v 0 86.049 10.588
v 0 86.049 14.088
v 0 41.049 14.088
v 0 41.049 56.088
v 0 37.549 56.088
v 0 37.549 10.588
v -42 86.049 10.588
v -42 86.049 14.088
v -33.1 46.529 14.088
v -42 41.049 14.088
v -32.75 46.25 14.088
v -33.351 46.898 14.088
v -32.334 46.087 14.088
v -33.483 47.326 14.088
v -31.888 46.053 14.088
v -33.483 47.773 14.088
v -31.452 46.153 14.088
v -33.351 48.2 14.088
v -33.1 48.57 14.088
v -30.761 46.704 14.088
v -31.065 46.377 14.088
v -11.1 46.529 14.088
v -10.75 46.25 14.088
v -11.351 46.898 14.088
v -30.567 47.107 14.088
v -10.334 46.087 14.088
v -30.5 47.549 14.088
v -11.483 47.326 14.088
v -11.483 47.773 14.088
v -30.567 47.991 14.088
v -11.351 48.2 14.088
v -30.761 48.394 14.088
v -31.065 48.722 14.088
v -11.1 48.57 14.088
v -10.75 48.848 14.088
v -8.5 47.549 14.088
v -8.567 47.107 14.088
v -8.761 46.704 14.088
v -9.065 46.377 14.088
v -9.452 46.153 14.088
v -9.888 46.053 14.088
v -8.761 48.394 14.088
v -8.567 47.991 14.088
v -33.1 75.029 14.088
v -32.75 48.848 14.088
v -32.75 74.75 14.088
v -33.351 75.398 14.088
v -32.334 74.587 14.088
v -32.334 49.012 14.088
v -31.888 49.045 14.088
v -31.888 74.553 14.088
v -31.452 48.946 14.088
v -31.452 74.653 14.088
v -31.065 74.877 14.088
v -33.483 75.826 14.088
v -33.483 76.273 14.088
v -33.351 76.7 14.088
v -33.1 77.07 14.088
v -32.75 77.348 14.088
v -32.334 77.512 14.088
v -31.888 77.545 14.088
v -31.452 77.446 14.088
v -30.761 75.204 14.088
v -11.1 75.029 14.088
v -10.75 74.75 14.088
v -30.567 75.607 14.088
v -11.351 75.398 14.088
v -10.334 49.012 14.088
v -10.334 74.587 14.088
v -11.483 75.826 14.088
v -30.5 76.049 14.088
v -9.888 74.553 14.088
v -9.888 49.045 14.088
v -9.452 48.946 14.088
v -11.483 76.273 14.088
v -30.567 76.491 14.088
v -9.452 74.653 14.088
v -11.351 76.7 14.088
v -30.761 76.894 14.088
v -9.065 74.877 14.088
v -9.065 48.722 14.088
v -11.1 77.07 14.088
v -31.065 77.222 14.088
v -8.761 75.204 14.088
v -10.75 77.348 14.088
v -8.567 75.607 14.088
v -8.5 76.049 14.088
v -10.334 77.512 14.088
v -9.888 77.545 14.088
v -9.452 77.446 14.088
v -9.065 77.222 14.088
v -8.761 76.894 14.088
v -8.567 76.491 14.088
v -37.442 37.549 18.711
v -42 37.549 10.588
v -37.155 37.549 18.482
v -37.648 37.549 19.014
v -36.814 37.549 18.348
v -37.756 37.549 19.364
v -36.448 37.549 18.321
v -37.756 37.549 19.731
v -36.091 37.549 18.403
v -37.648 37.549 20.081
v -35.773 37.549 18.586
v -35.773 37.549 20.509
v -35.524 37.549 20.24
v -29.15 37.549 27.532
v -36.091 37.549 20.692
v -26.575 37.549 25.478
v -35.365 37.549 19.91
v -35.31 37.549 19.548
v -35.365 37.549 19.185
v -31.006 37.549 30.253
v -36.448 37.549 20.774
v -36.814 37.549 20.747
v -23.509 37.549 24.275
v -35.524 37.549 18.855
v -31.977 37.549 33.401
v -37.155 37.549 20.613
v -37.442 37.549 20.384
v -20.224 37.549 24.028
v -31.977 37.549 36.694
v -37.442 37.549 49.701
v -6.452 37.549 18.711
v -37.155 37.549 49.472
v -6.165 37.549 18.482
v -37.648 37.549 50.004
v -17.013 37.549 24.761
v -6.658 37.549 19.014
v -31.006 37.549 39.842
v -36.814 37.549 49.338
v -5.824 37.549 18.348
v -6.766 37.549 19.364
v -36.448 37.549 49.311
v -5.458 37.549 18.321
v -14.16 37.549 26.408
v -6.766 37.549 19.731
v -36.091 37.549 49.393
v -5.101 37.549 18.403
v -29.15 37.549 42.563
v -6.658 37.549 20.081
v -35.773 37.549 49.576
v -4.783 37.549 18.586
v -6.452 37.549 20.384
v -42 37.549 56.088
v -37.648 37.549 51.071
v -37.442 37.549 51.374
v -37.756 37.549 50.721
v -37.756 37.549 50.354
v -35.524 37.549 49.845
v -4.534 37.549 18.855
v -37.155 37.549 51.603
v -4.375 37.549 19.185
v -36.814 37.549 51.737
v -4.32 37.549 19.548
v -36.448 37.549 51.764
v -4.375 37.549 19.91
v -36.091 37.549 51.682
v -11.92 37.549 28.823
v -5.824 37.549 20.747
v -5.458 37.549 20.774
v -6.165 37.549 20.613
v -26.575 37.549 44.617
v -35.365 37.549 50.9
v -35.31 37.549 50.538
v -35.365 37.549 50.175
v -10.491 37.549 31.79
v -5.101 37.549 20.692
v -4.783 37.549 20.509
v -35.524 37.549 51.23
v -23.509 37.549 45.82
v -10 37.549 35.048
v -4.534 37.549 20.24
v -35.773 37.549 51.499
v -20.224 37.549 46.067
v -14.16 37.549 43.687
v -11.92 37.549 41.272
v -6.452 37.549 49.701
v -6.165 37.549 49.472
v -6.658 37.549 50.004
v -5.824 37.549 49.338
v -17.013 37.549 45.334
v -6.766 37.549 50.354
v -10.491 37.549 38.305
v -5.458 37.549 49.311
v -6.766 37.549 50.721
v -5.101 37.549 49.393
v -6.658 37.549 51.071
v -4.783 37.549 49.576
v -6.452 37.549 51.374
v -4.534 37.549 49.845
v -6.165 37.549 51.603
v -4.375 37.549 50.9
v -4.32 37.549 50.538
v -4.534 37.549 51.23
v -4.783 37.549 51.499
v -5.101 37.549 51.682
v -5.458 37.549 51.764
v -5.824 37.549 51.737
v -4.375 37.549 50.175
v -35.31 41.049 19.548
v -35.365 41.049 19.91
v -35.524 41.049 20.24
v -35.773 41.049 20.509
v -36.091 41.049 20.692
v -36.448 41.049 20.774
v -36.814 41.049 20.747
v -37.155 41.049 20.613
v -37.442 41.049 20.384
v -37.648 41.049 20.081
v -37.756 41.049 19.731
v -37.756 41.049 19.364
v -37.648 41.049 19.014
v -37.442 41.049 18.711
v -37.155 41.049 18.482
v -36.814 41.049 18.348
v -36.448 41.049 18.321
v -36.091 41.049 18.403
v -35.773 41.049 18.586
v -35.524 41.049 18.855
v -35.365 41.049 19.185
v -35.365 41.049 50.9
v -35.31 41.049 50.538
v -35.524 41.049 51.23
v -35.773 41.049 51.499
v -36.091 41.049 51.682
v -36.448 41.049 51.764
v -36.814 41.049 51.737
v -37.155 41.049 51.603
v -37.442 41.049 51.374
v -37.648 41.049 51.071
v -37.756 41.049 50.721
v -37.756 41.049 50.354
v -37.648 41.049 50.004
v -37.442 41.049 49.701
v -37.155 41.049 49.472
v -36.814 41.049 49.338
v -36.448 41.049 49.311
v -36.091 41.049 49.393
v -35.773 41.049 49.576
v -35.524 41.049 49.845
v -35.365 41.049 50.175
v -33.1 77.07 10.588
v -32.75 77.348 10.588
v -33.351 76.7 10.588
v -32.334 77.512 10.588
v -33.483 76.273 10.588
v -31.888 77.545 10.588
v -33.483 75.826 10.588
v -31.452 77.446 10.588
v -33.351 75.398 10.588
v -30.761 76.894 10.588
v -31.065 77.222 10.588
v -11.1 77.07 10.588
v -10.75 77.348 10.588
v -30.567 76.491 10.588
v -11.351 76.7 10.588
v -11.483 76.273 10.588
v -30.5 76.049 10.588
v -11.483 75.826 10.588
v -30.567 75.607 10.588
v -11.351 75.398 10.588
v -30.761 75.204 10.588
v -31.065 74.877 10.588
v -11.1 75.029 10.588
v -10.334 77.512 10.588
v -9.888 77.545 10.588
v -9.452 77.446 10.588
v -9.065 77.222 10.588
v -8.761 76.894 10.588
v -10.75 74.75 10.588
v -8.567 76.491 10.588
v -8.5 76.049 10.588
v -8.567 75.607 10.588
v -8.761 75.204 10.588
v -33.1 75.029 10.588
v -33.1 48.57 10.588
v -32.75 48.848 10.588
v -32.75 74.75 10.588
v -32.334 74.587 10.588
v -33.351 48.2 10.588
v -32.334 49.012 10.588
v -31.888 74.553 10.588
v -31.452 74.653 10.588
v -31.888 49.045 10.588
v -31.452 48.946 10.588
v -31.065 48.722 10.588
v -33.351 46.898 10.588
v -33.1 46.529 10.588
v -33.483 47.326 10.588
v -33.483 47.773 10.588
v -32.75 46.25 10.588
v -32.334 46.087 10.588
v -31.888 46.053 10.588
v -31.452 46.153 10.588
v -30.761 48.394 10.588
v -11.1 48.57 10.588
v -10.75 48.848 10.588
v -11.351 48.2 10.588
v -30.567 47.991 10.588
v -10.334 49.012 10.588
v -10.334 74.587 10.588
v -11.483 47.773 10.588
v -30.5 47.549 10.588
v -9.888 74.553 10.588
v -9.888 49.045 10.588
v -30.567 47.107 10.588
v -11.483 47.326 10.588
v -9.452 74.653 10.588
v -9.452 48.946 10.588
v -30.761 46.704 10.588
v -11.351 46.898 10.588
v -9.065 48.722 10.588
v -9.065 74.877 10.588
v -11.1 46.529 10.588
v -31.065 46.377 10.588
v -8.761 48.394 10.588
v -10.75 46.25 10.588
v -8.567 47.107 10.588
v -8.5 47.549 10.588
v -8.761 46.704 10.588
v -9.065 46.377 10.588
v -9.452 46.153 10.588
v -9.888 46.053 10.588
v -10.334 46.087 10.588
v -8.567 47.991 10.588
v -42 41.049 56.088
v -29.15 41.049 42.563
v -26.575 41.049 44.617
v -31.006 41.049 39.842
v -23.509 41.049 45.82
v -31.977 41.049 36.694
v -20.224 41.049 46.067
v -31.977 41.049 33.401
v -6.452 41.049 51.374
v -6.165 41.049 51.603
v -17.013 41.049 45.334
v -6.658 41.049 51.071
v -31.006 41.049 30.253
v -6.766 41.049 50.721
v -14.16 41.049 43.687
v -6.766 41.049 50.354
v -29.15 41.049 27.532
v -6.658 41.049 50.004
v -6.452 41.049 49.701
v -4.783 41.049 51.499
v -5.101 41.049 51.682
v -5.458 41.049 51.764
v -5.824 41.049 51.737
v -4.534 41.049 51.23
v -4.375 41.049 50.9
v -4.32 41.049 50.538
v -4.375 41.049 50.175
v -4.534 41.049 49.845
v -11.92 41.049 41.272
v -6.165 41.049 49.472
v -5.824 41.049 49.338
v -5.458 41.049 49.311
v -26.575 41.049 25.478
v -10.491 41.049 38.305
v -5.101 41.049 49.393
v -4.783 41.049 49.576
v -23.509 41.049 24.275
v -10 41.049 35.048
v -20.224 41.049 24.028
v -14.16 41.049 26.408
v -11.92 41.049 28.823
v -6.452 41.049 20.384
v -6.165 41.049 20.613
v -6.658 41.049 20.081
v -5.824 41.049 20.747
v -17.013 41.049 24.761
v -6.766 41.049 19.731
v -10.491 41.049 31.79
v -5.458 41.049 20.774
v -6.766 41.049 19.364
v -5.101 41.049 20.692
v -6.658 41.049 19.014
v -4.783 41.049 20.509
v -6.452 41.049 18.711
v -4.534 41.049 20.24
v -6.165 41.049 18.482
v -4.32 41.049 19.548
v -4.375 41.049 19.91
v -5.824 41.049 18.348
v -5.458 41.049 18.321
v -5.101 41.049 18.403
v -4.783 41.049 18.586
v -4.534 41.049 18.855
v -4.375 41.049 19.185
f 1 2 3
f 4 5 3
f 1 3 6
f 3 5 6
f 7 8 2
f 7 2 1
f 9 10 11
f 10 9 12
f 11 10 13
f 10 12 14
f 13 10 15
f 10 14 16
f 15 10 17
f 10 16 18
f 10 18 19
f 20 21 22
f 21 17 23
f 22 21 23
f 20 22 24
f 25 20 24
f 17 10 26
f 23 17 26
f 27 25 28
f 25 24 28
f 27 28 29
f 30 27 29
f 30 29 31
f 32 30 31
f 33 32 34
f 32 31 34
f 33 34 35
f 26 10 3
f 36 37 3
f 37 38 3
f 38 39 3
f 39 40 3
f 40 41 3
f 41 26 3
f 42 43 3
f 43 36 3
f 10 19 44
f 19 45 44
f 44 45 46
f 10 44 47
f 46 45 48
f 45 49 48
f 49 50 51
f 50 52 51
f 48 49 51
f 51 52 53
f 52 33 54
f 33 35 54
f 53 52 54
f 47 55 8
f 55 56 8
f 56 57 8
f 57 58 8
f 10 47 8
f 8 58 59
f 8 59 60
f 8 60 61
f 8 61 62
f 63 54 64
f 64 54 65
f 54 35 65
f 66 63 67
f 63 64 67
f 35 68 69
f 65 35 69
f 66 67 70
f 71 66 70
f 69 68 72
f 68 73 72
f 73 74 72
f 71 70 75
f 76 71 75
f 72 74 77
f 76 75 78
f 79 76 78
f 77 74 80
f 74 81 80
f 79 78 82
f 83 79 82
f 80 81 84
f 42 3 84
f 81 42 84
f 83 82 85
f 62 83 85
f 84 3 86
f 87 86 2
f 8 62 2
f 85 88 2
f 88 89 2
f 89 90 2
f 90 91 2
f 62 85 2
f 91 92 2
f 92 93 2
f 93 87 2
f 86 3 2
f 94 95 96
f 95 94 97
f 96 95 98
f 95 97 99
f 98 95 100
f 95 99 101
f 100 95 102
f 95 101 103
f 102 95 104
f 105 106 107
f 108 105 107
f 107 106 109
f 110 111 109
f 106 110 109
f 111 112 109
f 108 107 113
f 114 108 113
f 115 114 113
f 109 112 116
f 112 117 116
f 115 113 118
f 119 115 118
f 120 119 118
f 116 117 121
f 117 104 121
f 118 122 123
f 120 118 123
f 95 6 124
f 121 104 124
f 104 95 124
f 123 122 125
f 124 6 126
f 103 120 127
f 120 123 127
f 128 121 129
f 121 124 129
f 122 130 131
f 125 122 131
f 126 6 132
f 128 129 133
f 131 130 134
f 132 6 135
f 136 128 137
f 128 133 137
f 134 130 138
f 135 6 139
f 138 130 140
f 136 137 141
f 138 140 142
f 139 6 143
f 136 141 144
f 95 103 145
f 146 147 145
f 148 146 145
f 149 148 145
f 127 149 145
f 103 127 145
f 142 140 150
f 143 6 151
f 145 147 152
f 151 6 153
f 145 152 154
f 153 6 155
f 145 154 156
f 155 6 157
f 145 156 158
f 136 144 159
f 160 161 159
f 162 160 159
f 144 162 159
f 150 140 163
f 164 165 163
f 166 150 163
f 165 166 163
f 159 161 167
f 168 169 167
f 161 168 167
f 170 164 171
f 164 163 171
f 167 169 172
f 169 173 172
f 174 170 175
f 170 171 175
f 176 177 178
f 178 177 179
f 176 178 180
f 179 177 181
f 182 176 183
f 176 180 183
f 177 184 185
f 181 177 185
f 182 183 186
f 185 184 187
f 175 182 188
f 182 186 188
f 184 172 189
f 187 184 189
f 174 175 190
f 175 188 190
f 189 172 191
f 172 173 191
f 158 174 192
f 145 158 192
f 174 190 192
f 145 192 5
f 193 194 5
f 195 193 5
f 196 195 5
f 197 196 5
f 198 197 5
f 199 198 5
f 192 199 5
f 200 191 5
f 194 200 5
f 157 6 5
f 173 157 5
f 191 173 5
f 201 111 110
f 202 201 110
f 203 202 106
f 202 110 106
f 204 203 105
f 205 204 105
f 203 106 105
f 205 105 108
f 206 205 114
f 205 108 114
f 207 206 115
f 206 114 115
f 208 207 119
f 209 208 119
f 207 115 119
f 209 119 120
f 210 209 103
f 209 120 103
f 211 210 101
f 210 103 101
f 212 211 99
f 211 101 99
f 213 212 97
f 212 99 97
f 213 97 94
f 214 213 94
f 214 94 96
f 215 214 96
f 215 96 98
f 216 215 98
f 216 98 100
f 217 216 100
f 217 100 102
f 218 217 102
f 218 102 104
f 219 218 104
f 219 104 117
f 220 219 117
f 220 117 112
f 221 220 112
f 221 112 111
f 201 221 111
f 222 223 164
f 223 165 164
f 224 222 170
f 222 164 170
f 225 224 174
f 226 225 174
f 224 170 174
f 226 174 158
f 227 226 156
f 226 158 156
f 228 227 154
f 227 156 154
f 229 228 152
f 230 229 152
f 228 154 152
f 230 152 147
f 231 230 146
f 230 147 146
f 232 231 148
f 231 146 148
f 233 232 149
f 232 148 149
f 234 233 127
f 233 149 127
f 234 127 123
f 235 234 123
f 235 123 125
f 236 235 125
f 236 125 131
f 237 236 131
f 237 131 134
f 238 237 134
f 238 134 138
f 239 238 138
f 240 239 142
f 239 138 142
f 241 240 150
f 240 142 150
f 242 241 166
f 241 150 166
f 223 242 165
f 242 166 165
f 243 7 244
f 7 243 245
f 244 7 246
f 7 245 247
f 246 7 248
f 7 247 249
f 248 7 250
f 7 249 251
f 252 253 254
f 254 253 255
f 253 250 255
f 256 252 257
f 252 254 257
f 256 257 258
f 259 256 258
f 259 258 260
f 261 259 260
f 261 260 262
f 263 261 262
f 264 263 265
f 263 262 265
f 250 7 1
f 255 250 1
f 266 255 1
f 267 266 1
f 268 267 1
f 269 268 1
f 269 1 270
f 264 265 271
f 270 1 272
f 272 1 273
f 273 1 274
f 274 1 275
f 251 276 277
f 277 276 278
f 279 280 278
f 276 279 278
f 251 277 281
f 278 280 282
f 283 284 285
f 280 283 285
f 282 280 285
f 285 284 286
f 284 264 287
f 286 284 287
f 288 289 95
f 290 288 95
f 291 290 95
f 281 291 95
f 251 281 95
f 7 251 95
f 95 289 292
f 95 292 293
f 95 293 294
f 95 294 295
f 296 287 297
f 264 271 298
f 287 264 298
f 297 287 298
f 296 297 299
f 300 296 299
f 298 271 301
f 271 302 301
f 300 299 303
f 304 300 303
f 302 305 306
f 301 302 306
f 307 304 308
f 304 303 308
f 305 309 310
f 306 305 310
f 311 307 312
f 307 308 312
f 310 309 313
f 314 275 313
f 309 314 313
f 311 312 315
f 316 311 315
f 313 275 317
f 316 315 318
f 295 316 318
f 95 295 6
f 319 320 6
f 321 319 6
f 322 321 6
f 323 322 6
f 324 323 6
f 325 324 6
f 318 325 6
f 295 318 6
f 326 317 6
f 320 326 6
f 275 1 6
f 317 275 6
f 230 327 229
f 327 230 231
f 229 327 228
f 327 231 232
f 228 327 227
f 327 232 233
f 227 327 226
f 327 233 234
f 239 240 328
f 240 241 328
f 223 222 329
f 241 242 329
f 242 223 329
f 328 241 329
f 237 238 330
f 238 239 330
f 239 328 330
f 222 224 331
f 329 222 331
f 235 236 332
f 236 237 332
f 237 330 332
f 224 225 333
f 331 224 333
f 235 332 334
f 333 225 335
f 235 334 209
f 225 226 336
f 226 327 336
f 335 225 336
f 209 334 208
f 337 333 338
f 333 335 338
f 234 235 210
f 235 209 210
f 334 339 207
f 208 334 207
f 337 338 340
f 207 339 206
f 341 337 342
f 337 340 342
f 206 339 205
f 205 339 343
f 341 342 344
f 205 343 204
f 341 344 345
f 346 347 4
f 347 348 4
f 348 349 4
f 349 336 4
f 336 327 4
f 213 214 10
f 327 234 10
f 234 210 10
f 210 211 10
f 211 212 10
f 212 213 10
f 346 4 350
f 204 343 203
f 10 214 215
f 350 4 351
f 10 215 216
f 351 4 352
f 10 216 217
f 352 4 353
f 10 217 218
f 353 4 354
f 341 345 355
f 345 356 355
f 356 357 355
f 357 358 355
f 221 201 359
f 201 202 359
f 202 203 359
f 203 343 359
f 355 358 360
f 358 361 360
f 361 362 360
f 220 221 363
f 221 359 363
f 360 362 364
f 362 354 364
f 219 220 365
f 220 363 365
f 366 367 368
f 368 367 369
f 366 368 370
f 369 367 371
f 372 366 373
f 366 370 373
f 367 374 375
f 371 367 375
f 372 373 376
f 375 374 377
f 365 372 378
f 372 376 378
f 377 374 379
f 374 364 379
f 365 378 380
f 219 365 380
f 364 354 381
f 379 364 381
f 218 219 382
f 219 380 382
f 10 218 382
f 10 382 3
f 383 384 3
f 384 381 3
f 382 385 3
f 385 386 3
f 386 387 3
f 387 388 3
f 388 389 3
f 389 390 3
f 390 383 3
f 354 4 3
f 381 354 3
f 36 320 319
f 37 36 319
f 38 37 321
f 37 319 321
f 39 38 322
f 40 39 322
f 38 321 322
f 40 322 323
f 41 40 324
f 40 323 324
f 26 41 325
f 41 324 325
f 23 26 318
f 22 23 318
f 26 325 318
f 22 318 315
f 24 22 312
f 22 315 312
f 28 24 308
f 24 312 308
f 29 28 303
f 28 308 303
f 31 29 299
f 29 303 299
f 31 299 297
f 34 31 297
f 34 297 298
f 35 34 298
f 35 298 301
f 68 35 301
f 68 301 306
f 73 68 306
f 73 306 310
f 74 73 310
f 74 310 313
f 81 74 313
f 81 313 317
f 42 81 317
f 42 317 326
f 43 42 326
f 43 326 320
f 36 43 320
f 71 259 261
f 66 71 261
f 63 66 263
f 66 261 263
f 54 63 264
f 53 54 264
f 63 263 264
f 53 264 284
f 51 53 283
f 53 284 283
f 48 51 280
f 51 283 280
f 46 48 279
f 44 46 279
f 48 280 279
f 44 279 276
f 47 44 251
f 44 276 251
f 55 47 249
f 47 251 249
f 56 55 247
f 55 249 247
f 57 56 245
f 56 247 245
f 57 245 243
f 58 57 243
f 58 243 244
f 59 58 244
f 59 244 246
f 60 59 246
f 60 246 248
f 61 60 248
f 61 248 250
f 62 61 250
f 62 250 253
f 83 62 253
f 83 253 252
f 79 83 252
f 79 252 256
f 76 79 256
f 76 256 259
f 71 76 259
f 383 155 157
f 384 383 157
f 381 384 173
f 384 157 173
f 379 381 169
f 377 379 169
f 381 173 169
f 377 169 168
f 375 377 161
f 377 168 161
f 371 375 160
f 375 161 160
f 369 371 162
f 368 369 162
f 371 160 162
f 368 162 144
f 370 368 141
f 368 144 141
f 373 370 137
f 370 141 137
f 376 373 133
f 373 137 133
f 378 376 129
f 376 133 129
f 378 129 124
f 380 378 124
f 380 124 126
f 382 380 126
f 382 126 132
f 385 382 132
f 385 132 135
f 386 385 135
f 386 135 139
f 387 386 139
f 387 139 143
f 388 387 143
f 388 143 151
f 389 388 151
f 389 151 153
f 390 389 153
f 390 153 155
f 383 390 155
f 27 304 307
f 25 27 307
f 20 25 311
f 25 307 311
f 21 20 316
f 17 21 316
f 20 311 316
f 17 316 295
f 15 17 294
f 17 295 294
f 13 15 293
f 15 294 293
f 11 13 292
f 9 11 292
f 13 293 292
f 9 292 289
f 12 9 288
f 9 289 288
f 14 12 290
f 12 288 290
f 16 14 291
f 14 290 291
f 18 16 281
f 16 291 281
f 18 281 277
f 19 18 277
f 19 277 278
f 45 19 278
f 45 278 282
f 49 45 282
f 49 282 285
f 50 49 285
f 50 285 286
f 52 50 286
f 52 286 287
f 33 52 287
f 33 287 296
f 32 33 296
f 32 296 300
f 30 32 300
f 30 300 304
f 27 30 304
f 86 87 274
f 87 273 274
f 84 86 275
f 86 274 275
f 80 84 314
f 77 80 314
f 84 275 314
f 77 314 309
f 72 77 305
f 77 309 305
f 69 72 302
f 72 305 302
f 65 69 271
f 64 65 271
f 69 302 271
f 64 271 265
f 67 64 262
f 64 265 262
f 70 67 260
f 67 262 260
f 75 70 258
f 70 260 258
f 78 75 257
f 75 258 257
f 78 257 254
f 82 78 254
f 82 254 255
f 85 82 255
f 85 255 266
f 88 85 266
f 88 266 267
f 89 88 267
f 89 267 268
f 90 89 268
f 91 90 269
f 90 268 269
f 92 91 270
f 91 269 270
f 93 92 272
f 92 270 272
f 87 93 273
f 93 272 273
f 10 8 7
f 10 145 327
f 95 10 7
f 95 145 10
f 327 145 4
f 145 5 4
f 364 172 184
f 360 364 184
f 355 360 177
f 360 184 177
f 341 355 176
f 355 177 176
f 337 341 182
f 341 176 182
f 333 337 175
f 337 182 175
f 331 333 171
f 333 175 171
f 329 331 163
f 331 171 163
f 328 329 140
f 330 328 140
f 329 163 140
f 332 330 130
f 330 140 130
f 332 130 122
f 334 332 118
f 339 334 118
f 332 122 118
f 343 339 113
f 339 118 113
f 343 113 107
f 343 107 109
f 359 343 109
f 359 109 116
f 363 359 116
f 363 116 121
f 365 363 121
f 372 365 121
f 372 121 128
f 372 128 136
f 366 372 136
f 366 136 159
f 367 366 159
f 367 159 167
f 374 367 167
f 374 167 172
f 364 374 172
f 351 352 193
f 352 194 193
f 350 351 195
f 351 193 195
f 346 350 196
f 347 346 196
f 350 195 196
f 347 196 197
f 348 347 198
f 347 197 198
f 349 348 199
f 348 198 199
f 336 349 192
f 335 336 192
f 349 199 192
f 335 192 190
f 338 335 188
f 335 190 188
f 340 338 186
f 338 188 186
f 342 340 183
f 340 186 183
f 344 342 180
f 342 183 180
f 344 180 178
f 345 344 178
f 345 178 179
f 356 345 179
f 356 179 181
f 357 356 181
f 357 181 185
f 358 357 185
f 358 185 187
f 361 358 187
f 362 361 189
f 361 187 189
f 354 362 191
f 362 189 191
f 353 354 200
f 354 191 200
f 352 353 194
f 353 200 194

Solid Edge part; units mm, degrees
sketch "Sketch1" plane through (0, 0, 0) normal (1, 0, 0) x (0, 1, 0)
  line L0 (37.5493, 56.0875) -> (41.0493, 56.0875)
  line L1 (41.0493, 56.0875) -> (41.0493, 14.0875)
  line L2 (41.0493, 14.0875) -> (86.0493, 14.0875)
  line L3 (86.0493, 14.0875) -> (86.0493, 10.5875)
  line L4 (86.0493, 10.5875) -> (37.5493, 10.5875)
  line L5 (37.5493, 10.5875) -> (37.5493, 56.0875)
  dimension "D1" = 3.5
  dimension "D2" = 42
  dimension "D3" = 45.5
  dimension "D4" = 3.5
  dimension "D5" = 45
extrude "Protrusion1" add sketch "Sketch1" against normal blind 42
sketch "Sketch2" plane through (-21, 37.5493, 33.3375) normal (0, -1, 0) x (1, 0, 0)
  circle A0 centre (-15.54, -13.79) radius 1.23
  circle A1 centre (15.45, -13.79) radius 1.23
  circle A2 centre (-15.54, 17.2) radius 1.23
  circle A3 centre (15.45, 17.2) radius 1.23
  dimension "D1" = 2.46
  dimension "D2" = 5.46
  dimension "D3" = 5.46
  dimension "D4" = 5.46
  dimension "D5" = 30.99
  dimension "D6" = 5.46
  dimension "D7" = 30.99
  dimension "D8" = 2.46
  dimension "D9" = 30.99
  dimension "D10" = 30.99
extrude "Cutout1" cut sketch "Sketch2" against normal through all
sketch "Sketch3" plane through (-21, 37.5493, 33.3375) normal (0, -1, 0) x (1, 0, 0)
  circle A0 centre (-0.05, 1.71) radius 11.05
  dimension "D1" = 15.49
  dimension "D2" = 15.49
  dimension "D3" = 15.5
  dimension "D4" = 15.49
  dimension "D5" = 15.5
extrude "Cutout2" cut sketch "Sketch3" against normal through all
sketch "Sketch4" plane through (-21, 61.7993, 10.5875) normal (0, 0, -1) x (1, 0, 0)
  circle A0 centre (-11, -14.25) radius 1.5
  circle A1 centre (11, -14.25) radius 1.5
  circle A2 centre (-11, 14.25) radius 1.5
  circle A3 centre (11, 14.25) radius 1.5
  dimension "D1" = 3
  dimension "D2" = 10
  dimension "D3" = 10
  dimension "D4" = 10
  dimension "D5" = 10
extrude "Cutout3" cut sketch "Sketch4" against normal up to next
